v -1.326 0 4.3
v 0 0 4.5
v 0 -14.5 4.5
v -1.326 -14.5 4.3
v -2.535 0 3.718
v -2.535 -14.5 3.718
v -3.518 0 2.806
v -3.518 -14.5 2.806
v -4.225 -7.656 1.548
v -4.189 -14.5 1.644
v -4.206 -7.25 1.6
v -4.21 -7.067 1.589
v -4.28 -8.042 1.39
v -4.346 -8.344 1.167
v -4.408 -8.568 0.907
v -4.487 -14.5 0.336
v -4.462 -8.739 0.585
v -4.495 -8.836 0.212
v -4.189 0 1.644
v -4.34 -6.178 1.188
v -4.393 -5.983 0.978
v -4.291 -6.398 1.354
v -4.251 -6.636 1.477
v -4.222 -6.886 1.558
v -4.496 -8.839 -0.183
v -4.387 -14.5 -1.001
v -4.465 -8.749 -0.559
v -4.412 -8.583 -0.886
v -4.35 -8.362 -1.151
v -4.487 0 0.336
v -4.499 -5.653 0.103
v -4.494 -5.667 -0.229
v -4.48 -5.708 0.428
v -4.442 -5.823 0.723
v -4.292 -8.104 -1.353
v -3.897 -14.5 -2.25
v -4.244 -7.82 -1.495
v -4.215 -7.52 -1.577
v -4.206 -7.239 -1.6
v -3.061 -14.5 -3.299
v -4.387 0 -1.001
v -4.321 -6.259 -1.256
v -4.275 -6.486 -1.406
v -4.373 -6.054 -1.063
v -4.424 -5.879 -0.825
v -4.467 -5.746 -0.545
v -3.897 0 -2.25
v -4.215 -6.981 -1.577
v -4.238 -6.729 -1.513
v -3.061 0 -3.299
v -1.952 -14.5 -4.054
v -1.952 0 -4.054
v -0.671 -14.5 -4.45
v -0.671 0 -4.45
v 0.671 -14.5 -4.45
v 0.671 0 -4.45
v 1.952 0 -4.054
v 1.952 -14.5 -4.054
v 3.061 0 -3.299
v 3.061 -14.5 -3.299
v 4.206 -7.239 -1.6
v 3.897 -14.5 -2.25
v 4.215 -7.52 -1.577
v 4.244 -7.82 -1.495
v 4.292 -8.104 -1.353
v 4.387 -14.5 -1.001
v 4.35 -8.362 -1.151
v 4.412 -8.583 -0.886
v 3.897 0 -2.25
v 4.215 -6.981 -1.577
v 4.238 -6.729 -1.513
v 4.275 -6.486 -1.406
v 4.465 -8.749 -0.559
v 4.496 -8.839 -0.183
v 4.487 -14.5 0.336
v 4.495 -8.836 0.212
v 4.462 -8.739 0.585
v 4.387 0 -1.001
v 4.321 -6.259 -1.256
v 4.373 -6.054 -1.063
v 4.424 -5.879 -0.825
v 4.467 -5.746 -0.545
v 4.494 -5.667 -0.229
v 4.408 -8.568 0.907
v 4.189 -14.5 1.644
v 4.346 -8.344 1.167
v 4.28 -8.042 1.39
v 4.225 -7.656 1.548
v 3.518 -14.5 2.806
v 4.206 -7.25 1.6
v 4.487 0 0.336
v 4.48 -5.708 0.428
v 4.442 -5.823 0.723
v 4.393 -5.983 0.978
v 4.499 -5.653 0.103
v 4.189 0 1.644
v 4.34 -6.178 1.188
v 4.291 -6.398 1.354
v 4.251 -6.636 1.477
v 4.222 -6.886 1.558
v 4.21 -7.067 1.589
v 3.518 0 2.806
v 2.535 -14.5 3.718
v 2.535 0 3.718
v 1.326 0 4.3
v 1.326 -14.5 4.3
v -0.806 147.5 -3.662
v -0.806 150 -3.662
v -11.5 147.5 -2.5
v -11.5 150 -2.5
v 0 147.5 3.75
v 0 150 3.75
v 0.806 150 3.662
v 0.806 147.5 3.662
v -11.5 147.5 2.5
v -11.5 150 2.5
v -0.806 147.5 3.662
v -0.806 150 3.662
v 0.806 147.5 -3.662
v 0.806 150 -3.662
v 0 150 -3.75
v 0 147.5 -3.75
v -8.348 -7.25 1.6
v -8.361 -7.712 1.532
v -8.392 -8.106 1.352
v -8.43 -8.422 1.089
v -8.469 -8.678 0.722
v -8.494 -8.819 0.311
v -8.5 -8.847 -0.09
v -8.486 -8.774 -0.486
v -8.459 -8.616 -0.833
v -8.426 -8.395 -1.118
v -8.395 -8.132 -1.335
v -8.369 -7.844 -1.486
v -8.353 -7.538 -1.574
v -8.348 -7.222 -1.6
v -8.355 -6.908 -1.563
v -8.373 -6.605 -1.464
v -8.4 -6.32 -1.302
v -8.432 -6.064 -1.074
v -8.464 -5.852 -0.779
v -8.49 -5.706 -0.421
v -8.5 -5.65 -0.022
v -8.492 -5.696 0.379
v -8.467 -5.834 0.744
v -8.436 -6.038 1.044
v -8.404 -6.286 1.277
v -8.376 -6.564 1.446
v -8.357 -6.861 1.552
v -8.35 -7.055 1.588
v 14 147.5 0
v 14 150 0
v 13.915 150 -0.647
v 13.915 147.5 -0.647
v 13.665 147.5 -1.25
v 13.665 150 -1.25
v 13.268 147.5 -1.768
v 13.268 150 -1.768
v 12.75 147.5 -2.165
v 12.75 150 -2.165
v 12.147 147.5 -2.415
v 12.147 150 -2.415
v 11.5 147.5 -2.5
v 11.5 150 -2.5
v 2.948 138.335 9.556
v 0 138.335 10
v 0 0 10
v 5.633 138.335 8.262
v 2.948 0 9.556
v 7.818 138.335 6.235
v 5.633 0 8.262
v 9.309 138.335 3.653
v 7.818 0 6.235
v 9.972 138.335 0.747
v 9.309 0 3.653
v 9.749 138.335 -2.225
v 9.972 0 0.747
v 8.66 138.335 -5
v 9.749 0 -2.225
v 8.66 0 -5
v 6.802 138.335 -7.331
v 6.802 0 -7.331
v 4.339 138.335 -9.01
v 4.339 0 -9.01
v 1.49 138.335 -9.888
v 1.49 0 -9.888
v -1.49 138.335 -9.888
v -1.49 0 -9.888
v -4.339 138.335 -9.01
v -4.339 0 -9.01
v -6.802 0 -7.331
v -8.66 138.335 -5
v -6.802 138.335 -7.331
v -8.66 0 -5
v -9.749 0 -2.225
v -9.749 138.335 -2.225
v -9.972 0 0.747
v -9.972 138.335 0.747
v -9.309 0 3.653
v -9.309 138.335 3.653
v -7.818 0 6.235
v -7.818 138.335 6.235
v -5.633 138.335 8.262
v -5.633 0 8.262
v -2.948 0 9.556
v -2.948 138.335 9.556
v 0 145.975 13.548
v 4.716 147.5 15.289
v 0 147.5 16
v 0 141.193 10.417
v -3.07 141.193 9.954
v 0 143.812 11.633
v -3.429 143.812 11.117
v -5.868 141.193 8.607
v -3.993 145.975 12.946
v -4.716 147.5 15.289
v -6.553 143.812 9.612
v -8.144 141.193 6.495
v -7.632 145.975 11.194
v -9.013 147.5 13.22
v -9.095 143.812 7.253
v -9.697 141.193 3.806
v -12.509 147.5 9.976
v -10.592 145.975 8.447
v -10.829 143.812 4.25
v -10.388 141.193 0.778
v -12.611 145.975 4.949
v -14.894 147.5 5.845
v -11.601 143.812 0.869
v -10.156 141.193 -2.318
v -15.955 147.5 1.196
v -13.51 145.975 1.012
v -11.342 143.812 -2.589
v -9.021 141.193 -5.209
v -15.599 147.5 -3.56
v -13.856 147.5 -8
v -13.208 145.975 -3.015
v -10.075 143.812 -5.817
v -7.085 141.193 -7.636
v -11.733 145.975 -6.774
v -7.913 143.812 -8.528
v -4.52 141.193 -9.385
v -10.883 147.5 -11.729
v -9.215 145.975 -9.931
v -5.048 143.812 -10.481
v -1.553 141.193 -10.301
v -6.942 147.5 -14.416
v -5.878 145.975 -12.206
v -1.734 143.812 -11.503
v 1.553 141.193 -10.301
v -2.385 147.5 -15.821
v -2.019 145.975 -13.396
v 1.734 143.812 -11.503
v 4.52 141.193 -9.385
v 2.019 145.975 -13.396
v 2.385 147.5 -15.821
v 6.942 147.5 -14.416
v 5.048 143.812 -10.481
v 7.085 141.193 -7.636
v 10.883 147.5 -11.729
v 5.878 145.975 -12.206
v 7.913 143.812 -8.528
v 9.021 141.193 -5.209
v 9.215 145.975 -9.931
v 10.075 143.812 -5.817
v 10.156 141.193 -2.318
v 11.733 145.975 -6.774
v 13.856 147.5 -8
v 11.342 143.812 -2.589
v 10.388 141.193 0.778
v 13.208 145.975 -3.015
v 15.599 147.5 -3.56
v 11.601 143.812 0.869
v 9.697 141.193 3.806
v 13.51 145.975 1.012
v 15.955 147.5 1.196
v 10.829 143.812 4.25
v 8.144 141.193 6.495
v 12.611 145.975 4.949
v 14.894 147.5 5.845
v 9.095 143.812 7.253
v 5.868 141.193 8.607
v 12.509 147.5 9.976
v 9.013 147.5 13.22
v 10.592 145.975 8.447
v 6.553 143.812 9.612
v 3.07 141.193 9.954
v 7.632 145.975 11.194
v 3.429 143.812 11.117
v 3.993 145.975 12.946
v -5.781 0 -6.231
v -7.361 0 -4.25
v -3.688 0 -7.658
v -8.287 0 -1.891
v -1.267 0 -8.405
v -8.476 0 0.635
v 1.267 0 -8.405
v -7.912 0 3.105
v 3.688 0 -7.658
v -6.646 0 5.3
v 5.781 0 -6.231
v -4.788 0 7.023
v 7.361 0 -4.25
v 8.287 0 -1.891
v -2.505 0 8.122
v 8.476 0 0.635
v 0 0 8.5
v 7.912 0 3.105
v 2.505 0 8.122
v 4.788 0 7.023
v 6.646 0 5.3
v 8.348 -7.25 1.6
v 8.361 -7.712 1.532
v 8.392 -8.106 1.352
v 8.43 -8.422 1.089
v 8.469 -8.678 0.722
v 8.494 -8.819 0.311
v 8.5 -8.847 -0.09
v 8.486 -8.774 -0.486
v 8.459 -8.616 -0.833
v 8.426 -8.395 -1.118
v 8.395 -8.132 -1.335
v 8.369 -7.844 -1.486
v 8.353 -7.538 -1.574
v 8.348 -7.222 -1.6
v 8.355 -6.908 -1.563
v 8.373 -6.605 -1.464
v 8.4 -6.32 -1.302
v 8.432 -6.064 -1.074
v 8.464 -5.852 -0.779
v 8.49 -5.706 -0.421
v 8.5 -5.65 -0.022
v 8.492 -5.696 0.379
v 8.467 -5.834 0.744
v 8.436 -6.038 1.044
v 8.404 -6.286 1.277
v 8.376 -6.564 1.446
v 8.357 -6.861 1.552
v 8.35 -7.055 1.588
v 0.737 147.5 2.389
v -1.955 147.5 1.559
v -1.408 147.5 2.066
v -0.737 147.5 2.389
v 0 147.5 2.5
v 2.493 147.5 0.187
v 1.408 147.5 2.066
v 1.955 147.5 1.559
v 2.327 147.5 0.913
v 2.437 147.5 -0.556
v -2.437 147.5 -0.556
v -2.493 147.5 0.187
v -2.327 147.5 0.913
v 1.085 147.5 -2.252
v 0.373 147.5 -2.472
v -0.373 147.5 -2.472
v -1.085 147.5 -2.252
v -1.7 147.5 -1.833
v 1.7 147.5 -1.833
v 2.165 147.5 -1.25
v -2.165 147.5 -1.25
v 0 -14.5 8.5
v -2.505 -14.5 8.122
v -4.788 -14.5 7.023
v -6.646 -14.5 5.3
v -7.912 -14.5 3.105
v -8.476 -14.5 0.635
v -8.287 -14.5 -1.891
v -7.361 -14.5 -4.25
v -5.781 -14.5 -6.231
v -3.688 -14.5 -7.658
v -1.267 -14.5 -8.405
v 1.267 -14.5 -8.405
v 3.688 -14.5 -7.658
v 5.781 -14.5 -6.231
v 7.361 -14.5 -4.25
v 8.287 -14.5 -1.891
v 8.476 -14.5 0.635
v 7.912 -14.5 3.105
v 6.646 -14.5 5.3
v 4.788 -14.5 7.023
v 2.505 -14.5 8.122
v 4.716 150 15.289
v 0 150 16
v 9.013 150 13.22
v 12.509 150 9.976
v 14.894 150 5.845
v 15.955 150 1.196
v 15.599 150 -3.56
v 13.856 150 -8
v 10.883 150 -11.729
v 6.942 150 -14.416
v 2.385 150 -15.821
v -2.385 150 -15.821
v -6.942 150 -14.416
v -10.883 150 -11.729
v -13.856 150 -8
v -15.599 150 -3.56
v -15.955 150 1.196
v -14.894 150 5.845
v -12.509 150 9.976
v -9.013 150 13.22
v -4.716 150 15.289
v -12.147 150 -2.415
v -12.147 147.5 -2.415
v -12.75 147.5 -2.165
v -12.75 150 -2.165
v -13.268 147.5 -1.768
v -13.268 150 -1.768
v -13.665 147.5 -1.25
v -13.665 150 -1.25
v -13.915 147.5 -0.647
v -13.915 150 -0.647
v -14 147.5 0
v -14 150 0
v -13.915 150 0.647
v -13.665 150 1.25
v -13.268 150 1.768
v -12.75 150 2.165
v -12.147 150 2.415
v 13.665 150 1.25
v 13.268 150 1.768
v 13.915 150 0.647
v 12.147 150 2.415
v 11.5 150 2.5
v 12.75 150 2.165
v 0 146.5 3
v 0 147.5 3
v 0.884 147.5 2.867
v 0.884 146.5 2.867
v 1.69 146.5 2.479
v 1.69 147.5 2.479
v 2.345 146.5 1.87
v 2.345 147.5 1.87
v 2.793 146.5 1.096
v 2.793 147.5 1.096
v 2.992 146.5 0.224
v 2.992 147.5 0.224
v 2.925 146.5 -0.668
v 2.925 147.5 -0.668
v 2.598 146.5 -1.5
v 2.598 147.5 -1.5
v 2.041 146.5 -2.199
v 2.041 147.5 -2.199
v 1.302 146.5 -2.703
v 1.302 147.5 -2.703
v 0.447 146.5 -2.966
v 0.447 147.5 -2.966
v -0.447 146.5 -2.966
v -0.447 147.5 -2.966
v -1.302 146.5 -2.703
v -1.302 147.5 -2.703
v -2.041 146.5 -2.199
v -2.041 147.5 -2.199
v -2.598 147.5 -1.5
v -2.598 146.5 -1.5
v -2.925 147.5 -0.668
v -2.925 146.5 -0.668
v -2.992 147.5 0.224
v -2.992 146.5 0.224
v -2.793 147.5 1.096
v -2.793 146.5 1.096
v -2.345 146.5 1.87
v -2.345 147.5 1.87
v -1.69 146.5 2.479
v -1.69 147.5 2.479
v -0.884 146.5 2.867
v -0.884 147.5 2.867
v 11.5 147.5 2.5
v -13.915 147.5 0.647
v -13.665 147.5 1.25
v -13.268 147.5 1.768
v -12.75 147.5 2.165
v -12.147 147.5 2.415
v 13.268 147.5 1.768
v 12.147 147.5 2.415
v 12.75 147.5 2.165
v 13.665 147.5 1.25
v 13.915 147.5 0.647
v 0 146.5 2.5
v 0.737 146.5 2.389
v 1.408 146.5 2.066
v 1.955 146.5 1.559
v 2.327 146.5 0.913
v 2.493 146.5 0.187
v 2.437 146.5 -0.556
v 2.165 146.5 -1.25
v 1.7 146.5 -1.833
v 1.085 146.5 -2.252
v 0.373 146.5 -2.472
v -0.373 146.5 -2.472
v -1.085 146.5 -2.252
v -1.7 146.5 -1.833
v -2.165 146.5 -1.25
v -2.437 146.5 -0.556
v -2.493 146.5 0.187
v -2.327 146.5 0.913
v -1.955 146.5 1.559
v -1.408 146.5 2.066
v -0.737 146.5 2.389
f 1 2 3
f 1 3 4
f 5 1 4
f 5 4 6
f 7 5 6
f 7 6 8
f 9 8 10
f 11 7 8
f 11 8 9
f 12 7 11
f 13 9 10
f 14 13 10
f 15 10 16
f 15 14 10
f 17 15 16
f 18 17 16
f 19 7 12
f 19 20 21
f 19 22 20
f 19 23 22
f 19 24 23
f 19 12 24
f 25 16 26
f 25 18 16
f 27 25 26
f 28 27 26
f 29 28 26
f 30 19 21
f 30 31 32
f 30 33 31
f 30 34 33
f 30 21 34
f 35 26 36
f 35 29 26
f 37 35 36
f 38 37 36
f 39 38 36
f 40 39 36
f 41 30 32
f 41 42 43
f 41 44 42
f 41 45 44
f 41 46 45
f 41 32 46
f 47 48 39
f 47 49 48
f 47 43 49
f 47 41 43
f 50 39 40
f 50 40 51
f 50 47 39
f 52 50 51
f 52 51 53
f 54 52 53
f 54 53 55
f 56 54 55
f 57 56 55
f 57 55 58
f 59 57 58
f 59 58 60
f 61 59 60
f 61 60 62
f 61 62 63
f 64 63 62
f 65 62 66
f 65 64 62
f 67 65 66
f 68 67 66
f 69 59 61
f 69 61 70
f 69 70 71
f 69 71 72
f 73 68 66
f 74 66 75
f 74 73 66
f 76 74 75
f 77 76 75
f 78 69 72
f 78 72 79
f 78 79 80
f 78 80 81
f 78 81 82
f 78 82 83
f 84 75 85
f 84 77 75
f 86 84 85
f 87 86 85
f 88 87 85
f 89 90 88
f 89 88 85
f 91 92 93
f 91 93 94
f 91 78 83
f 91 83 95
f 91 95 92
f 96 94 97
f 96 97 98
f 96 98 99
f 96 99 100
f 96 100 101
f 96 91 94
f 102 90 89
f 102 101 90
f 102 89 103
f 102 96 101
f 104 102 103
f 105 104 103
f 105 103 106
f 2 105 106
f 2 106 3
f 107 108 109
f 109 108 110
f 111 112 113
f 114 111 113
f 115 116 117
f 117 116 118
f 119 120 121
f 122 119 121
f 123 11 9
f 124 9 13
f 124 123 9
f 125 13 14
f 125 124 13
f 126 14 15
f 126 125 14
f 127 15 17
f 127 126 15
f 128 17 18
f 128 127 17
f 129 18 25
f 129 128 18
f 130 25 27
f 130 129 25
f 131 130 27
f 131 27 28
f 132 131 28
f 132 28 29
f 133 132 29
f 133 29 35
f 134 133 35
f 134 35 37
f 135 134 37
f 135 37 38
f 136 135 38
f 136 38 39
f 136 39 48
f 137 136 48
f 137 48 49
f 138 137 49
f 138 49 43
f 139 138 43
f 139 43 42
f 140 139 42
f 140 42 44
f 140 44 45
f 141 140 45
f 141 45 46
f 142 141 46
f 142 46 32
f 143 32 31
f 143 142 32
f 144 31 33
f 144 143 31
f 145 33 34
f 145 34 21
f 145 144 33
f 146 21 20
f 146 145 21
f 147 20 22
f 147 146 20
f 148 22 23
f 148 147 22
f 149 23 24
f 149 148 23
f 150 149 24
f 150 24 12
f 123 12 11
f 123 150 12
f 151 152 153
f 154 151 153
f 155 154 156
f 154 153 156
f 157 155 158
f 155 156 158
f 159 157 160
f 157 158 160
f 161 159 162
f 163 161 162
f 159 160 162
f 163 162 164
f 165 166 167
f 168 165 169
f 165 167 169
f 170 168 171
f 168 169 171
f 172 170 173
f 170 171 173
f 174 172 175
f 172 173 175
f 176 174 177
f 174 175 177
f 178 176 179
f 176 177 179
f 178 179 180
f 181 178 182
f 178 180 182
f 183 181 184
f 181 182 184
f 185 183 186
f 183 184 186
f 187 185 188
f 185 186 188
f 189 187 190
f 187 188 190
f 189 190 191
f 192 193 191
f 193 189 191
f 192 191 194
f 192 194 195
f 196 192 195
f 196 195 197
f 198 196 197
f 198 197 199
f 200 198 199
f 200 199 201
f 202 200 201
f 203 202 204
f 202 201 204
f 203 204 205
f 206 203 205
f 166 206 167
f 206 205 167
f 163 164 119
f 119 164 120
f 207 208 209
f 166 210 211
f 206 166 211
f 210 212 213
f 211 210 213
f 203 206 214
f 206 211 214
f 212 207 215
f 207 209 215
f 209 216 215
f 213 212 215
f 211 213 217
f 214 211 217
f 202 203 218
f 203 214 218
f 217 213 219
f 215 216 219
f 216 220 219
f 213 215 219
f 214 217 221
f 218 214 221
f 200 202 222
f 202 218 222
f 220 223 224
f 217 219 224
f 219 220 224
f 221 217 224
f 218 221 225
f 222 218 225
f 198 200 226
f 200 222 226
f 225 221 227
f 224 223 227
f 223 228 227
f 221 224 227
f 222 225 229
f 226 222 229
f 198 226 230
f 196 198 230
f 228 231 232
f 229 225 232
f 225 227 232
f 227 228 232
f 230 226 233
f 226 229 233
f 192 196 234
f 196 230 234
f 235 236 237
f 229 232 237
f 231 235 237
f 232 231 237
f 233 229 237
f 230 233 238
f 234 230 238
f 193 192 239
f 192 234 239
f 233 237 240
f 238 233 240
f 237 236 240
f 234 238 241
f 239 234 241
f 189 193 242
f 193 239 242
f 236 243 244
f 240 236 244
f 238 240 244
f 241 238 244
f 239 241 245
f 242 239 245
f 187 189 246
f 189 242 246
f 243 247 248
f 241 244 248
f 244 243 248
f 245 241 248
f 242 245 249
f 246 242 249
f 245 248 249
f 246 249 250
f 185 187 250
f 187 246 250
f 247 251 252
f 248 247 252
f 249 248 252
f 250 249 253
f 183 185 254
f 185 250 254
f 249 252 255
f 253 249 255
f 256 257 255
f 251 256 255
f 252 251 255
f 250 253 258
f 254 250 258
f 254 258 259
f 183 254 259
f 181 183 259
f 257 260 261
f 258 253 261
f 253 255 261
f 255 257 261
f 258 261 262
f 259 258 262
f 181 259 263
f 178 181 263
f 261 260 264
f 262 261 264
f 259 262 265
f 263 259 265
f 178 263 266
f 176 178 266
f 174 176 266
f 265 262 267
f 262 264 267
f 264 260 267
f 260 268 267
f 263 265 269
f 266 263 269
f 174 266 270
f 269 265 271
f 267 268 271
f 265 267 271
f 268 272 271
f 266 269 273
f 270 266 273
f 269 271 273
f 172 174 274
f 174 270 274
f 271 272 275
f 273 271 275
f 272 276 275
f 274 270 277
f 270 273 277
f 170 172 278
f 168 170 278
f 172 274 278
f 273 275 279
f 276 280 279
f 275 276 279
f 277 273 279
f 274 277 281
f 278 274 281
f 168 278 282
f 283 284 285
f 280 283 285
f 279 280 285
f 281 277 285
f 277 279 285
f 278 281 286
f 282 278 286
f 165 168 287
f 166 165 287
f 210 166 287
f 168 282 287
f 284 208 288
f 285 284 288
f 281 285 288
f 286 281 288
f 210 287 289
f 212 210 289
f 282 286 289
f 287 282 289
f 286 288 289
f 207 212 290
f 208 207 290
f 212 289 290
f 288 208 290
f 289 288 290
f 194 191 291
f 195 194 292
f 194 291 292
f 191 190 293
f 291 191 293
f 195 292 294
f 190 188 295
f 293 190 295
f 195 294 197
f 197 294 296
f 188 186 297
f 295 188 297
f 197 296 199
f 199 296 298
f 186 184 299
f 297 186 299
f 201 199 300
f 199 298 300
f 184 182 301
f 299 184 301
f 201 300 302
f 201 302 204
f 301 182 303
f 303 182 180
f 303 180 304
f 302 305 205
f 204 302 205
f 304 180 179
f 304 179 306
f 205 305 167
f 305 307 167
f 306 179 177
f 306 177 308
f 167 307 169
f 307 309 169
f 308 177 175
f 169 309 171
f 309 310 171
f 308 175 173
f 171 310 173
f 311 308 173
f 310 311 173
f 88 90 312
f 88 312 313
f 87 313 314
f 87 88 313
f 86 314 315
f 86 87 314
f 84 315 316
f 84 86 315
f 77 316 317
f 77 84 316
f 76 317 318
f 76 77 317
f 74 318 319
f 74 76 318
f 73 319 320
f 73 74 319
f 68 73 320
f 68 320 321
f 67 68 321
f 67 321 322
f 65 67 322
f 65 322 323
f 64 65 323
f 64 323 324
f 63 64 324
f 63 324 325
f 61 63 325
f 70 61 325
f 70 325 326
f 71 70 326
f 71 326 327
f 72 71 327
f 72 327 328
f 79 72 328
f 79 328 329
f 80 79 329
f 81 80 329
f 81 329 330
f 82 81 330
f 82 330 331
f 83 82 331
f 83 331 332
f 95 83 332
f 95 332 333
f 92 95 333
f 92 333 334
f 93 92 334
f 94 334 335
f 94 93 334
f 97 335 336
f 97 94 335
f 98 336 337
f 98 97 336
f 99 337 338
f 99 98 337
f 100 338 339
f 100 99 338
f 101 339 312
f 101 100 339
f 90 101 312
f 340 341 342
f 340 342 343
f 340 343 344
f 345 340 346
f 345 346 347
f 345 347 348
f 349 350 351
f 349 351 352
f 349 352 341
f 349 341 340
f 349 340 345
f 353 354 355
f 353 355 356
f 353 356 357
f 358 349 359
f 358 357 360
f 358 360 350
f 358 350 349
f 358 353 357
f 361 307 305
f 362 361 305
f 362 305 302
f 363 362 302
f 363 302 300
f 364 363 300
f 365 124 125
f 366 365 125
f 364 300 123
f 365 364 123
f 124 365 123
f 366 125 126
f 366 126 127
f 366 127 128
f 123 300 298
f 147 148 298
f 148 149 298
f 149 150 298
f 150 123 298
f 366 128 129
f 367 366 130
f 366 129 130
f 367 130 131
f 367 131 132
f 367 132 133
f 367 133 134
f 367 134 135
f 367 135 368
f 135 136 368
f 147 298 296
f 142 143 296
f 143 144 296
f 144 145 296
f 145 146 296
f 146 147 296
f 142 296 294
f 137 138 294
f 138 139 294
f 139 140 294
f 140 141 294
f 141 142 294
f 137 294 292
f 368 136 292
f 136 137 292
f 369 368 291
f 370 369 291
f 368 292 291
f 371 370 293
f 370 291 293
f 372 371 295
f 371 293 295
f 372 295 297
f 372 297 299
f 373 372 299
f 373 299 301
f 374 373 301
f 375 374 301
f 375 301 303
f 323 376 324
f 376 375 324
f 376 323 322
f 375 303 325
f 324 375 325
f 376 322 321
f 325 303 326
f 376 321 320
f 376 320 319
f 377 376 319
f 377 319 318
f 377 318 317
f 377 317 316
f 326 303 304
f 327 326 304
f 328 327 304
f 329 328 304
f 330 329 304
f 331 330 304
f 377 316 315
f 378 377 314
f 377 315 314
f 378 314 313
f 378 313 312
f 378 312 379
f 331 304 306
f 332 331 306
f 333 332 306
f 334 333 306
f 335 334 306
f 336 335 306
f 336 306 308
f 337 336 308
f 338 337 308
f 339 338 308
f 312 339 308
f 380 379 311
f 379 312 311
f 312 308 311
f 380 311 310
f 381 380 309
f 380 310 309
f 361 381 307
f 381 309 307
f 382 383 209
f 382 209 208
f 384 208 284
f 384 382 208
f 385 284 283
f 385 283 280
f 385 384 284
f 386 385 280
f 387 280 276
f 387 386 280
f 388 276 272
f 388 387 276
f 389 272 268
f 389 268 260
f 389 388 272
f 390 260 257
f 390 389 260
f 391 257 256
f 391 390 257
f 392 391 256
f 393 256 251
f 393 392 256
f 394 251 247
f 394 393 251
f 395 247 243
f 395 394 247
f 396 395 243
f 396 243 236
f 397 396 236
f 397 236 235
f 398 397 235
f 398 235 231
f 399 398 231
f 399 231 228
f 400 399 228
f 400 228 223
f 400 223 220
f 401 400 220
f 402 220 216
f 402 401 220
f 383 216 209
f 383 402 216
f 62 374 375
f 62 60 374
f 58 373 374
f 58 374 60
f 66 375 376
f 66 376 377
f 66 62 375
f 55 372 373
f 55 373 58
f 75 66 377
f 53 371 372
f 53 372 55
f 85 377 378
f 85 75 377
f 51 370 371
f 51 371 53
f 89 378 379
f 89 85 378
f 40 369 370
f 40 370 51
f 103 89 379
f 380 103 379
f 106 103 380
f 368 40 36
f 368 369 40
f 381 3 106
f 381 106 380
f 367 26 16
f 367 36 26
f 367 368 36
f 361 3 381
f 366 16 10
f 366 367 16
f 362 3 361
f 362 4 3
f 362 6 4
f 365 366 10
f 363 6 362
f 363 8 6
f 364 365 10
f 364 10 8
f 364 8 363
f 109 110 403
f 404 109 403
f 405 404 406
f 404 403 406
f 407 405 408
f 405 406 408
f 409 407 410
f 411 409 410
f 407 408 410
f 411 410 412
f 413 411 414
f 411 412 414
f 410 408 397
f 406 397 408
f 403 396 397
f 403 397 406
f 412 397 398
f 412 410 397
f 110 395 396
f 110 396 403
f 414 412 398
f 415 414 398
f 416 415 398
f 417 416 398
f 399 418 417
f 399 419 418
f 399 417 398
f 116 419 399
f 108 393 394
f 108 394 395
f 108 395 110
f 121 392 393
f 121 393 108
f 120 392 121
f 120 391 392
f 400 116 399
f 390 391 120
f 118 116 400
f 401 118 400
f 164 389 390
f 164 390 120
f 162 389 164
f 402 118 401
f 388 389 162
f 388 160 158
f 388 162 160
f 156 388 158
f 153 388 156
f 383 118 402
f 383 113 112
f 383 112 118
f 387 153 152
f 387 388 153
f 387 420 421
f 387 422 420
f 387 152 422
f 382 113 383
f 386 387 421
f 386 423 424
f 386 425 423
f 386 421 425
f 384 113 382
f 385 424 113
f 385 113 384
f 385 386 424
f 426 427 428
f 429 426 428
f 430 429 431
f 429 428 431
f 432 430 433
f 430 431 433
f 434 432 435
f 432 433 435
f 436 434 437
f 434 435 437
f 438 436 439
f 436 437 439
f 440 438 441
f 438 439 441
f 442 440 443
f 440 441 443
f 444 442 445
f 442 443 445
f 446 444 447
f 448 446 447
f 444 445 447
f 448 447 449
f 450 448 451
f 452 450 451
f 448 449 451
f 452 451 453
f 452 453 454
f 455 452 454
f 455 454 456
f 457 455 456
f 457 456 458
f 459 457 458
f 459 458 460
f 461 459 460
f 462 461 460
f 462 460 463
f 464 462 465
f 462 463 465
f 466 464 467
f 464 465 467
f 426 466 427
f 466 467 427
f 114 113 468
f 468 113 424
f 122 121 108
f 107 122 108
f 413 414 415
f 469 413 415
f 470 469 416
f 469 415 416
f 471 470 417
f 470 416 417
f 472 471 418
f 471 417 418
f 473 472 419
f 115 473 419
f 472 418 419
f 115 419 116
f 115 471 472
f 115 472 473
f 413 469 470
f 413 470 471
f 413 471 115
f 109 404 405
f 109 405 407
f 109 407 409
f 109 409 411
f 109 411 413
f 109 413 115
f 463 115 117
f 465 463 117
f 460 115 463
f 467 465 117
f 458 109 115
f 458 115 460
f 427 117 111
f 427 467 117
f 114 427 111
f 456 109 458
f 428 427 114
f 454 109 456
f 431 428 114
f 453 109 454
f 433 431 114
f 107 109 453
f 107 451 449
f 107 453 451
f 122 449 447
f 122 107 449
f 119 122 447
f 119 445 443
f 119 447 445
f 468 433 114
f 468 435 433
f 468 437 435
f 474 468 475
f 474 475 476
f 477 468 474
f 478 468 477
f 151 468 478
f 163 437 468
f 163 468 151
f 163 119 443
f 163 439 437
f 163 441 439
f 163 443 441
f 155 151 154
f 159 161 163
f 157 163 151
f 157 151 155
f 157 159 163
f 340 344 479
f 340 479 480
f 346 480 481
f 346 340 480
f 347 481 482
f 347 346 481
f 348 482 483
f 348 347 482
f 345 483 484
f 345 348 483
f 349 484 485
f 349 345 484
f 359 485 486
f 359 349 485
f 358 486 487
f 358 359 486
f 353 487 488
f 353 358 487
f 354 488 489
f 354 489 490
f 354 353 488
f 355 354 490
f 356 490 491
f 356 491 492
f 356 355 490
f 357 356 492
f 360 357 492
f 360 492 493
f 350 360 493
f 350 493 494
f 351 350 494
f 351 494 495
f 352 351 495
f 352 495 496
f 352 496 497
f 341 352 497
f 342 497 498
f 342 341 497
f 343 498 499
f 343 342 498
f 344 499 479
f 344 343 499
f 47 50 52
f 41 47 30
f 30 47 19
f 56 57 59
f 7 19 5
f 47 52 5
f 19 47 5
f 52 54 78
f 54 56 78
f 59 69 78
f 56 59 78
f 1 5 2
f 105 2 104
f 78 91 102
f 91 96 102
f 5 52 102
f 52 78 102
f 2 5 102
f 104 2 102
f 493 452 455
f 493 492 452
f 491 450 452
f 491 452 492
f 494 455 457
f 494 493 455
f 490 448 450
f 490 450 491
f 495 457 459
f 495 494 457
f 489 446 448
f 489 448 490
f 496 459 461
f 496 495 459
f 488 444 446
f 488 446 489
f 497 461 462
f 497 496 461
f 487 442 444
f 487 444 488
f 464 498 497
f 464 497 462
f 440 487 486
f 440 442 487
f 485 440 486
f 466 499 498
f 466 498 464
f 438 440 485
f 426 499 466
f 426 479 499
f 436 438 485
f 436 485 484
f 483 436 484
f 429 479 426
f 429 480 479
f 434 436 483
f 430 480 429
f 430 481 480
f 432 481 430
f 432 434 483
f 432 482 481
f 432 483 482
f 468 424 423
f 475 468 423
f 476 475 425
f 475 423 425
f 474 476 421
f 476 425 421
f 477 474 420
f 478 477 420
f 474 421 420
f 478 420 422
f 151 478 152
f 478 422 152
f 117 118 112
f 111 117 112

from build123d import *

# Parameters (mm, degrees)
SKETCH1_R               = 10
BOSS_EXTRUDE1_DEPTH     = 150
SKETCH2_R               = 8.5
SKETCH2_R_2             = 4.5
BOSS_EXTRUDE2_DEPTH     = 14.5
CUT_EXTRUDE1_DEPTH      = 14.5
CUT_EXTRUDE1_DEPTH_BACK = 14.5
SKETCH3_R               = 1.6
SKETCH5_R               = 16
BOSS_EXTRUDE3_DEPTH     = 2.5
FILLET1_R               = 10
CUT_EXTRUDE2_DEPTH      = 2.5
SKETCH6_R               = 3
SKETCH6_R_2             = 2.5
CUT_EXTRUDE3_DEPTH      = 1


with BuildPart() as part:
    # Sketch1 → Boss-Extrude1 (new body)
    with BuildSketch(Plane(origin=(0, 0, 0), x_dir=(1, 0, 0), z_dir=(0, 1, 0))):
        with Locations(Location((0, 0, 0), (0, 0, 270))):
            Circle(SKETCH1_R)
    extrude(amount=BOSS_EXTRUDE1_DEPTH)

    # Sketch2 → Boss-Extrude2 (add)
    with BuildSketch(Plane.XZ):
        with Locations(Location((0, 0, 0), (0, 0, 90))):
            Circle(SKETCH2_R)
        with Locations(Location((0, 0, 0), (0, 0, 90))):
            Circle(SKETCH2_R_2, mode=Mode.SUBTRACT)
    extrude(amount=BOSS_EXTRUDE2_DEPTH)

    # Sketch3 → Cut-Extrude1 (cut, two sides: drawn at the far end of the back side and taken through both)
    with BuildSketch(Plane(origin=(0, 0, 0), x_dir=(0, 0, -1), z_dir=(1, 0, 0)).offset(-CUT_EXTRUDE1_DEPTH_BACK)):
        with Locations(Location((0, -7.25, 0), (0, 0, 180))):
            Circle(SKETCH3_R)
    extrude(amount=CUT_EXTRUDE1_DEPTH + CUT_EXTRUDE1_DEPTH_BACK, mode=Mode.SUBTRACT)

    # Sketch5 → Boss-Extrude3 (add)
    with BuildSketch(Plane(origin=(0, 150, 0), x_dir=(1, 0, 0), z_dir=(0, 1, 0))):
        with Locations(Location((0, 0, 0), (0, 0, 270))):
            Circle(SKETCH5_R)
    extrude(amount=-BOSS_EXTRUDE3_DEPTH)

    # Fillet1
    # the kernel refuses this fillet: 10 mm, written as the material it adds along each edge
    with BuildSketch(Plane(origin=(0, 147.5, 0), x_dir=(0, 0, 1), z_dir=(1, 0, 0))) as fillet1_piece_1:
        with BuildLine():
            CenterArc((20, 9.16515139), FILLET1_R, 180, 66.421821522)
            Line((16, 0), (15.92, -0.183303028))
            ThreePointArc((15.92, -0.183303028), (13, -0.2), (10, -0.2))
            Line((10, -0.2), (9.8, 0))
            Line((9.8, 0), (9.8, 9.16515139))
            Line((9.8, 9.16515139), (10, 9.16515139))
        make_face()
    revolve(axis=Axis((0, 147.5, 0), (0, -1, 0)))

    # Sketch4 → Cut-Extrude2 (cut)
    with BuildSketch(Plane(origin=(0, 150, 0), x_dir=(1, 0, 0), z_dir=(0, 1, 0))):
        with BuildLine():
            ThreePointArc((-11.5, 2.5), (-13.267766953, 1.767766953), (-14, 0))
            Line((-14, 0), (-9, 0))
            ThreePointArc((-9, 0), (-9.732233047, 1.767766953), (-11.5, 2.5))
        make_face()
        with BuildLine():
            Line((-9, 0), (-14, 0))
            ThreePointArc((-14, 0), (-13.267766953, -1.767766953), (-11.5, -2.5))
            ThreePointArc((-11.5, -2.5), (-9.732233047, -1.767766953), (-9, 0))
        make_face()
        with BuildLine():
            Line((-3.75, 0), (-9, 0))
            ThreePointArc((-9, 0), (-9.732233047, -1.767766953), (-11.5, -2.5))
            Line((-11.5, -2.5), (-0.805698272, -3.662424101))
            ThreePointArc((-0.805698272, -3.662424101), (-2.922658766, -2.349588419), (-3.75, 0))
        make_face()
        with BuildLine():
            ThreePointArc((-11.5, 2.5), (-9.732233047, 1.767766953), (-9, 0))
            Line((-9, 0), (-3.75, 0))
            ThreePointArc((-3.75, 0), (-2.922658766, 2.349588419), (-0.805698272, 3.662424101))
            Line((-0.805698272, 3.662424101), (-11.5, 2.5))
        make_face()
        with BuildLine():
            ThreePointArc((-0.805698272, 3.662424101), (-2.922658766, 2.349588419), (-3.75, 0))
            Line((-3.75, 0), (0, 0))
            Line((0, 0), (0, 3.75))
            Line((0, 3.75), (-0.805698272, 3.662424101))
        make_face()
        with BuildLine():
            Line((0, 0), (-3.75, 0))
            ThreePointArc((-3.75, 0), (-2.922658766, -2.349588419), (-0.805698272, -3.662424101))
            Line((-0.805698272, -3.662424101), (0, -3.75))
            Line((0, -3.75), (0.805698272, -3.662424101))
            ThreePointArc((0.805698272, -3.662424101), (2.922658766, -2.349588419), (3.75, 0))
            Line((3.75, 0), (0, 0))
        make_face()
        with BuildLine():
            Line((0, 3.75), (0, 0))
            Line((0, 0), (3.75, 0))
            ThreePointArc((3.75, 0), (2.922658766, 2.349588419), (0.805698272, 3.662424101))
            Line((0.805698272, 3.662424101), (0, 3.75))
        make_face()
        with BuildLine():
            ThreePointArc((0.805698272, 3.662424101), (2.922658766, 2.349588419), (3.75, 0))
            Line((3.75, 0), (9, 0))
            ThreePointArc((9, 0), (9.732233047, 1.767766953), (11.5, 2.5))
            Line((11.5, 2.5), (0.805698272, 3.662424101))
        make_face()
        with BuildLine():
            Line((9, 0), (3.75, 0))
            ThreePointArc((3.75, 0), (2.922658766, -2.349588419), (0.805698272, -3.662424101))
            Line((0.805698272, -3.662424101), (11.5, -2.5))
            ThreePointArc((11.5, -2.5), (9.732233047, -1.767766953), (9, 0))
        make_face()
        with BuildLine():
            ThreePointArc((11.5, 2.5), (9.732233047, 1.767766953), (9, 0))
            Line((9, 0), (11.5, 0))
            Line((11.5, 0), (11.5, 2.5))
        make_face()
        with BuildLine():
            Line((11.5, 0), (9, 0))
            ThreePointArc((9, 0), (9.732233047, -1.767766953), (11.5, -2.5))
            Line((11.5, -2.5), (11.5, 0))
        make_face()
        with BuildLine():
            ThreePointArc((14, 0), (13.267766953, 1.767766953), (11.5, 2.5))
            Line((11.5, 2.5), (11.5, 0))
            Line((11.5, 0), (14, 0))
        make_face()
        with BuildLine():
            Line((11.5, 0), (11.5, -2.5))
            ThreePointArc((11.5, -2.5), (13.267766953, -1.767766953), (14, 0))
            Line((14, 0), (11.5, 0))
        make_face()
    extrude(amount=-CUT_EXTRUDE2_DEPTH, mode=Mode.SUBTRACT)

    # Sketch6 → Cut-Extrude3 (cut)
    with BuildSketch(Plane(origin=(0, 147.5, 0), x_dir=(1, 0, 0), z_dir=(0, 1, 0))):
        with Locations(Location((0, 0, 0), (0, 0, 270))):
            Circle(SKETCH6_R)
        with Locations(Location((0, 0, 0), (0, 0, 270))):
            Circle(SKETCH6_R_2, mode=Mode.SUBTRACT)
    extrude(amount=-CUT_EXTRUDE3_DEPTH, mode=Mode.SUBTRACT)


solid = part.part
